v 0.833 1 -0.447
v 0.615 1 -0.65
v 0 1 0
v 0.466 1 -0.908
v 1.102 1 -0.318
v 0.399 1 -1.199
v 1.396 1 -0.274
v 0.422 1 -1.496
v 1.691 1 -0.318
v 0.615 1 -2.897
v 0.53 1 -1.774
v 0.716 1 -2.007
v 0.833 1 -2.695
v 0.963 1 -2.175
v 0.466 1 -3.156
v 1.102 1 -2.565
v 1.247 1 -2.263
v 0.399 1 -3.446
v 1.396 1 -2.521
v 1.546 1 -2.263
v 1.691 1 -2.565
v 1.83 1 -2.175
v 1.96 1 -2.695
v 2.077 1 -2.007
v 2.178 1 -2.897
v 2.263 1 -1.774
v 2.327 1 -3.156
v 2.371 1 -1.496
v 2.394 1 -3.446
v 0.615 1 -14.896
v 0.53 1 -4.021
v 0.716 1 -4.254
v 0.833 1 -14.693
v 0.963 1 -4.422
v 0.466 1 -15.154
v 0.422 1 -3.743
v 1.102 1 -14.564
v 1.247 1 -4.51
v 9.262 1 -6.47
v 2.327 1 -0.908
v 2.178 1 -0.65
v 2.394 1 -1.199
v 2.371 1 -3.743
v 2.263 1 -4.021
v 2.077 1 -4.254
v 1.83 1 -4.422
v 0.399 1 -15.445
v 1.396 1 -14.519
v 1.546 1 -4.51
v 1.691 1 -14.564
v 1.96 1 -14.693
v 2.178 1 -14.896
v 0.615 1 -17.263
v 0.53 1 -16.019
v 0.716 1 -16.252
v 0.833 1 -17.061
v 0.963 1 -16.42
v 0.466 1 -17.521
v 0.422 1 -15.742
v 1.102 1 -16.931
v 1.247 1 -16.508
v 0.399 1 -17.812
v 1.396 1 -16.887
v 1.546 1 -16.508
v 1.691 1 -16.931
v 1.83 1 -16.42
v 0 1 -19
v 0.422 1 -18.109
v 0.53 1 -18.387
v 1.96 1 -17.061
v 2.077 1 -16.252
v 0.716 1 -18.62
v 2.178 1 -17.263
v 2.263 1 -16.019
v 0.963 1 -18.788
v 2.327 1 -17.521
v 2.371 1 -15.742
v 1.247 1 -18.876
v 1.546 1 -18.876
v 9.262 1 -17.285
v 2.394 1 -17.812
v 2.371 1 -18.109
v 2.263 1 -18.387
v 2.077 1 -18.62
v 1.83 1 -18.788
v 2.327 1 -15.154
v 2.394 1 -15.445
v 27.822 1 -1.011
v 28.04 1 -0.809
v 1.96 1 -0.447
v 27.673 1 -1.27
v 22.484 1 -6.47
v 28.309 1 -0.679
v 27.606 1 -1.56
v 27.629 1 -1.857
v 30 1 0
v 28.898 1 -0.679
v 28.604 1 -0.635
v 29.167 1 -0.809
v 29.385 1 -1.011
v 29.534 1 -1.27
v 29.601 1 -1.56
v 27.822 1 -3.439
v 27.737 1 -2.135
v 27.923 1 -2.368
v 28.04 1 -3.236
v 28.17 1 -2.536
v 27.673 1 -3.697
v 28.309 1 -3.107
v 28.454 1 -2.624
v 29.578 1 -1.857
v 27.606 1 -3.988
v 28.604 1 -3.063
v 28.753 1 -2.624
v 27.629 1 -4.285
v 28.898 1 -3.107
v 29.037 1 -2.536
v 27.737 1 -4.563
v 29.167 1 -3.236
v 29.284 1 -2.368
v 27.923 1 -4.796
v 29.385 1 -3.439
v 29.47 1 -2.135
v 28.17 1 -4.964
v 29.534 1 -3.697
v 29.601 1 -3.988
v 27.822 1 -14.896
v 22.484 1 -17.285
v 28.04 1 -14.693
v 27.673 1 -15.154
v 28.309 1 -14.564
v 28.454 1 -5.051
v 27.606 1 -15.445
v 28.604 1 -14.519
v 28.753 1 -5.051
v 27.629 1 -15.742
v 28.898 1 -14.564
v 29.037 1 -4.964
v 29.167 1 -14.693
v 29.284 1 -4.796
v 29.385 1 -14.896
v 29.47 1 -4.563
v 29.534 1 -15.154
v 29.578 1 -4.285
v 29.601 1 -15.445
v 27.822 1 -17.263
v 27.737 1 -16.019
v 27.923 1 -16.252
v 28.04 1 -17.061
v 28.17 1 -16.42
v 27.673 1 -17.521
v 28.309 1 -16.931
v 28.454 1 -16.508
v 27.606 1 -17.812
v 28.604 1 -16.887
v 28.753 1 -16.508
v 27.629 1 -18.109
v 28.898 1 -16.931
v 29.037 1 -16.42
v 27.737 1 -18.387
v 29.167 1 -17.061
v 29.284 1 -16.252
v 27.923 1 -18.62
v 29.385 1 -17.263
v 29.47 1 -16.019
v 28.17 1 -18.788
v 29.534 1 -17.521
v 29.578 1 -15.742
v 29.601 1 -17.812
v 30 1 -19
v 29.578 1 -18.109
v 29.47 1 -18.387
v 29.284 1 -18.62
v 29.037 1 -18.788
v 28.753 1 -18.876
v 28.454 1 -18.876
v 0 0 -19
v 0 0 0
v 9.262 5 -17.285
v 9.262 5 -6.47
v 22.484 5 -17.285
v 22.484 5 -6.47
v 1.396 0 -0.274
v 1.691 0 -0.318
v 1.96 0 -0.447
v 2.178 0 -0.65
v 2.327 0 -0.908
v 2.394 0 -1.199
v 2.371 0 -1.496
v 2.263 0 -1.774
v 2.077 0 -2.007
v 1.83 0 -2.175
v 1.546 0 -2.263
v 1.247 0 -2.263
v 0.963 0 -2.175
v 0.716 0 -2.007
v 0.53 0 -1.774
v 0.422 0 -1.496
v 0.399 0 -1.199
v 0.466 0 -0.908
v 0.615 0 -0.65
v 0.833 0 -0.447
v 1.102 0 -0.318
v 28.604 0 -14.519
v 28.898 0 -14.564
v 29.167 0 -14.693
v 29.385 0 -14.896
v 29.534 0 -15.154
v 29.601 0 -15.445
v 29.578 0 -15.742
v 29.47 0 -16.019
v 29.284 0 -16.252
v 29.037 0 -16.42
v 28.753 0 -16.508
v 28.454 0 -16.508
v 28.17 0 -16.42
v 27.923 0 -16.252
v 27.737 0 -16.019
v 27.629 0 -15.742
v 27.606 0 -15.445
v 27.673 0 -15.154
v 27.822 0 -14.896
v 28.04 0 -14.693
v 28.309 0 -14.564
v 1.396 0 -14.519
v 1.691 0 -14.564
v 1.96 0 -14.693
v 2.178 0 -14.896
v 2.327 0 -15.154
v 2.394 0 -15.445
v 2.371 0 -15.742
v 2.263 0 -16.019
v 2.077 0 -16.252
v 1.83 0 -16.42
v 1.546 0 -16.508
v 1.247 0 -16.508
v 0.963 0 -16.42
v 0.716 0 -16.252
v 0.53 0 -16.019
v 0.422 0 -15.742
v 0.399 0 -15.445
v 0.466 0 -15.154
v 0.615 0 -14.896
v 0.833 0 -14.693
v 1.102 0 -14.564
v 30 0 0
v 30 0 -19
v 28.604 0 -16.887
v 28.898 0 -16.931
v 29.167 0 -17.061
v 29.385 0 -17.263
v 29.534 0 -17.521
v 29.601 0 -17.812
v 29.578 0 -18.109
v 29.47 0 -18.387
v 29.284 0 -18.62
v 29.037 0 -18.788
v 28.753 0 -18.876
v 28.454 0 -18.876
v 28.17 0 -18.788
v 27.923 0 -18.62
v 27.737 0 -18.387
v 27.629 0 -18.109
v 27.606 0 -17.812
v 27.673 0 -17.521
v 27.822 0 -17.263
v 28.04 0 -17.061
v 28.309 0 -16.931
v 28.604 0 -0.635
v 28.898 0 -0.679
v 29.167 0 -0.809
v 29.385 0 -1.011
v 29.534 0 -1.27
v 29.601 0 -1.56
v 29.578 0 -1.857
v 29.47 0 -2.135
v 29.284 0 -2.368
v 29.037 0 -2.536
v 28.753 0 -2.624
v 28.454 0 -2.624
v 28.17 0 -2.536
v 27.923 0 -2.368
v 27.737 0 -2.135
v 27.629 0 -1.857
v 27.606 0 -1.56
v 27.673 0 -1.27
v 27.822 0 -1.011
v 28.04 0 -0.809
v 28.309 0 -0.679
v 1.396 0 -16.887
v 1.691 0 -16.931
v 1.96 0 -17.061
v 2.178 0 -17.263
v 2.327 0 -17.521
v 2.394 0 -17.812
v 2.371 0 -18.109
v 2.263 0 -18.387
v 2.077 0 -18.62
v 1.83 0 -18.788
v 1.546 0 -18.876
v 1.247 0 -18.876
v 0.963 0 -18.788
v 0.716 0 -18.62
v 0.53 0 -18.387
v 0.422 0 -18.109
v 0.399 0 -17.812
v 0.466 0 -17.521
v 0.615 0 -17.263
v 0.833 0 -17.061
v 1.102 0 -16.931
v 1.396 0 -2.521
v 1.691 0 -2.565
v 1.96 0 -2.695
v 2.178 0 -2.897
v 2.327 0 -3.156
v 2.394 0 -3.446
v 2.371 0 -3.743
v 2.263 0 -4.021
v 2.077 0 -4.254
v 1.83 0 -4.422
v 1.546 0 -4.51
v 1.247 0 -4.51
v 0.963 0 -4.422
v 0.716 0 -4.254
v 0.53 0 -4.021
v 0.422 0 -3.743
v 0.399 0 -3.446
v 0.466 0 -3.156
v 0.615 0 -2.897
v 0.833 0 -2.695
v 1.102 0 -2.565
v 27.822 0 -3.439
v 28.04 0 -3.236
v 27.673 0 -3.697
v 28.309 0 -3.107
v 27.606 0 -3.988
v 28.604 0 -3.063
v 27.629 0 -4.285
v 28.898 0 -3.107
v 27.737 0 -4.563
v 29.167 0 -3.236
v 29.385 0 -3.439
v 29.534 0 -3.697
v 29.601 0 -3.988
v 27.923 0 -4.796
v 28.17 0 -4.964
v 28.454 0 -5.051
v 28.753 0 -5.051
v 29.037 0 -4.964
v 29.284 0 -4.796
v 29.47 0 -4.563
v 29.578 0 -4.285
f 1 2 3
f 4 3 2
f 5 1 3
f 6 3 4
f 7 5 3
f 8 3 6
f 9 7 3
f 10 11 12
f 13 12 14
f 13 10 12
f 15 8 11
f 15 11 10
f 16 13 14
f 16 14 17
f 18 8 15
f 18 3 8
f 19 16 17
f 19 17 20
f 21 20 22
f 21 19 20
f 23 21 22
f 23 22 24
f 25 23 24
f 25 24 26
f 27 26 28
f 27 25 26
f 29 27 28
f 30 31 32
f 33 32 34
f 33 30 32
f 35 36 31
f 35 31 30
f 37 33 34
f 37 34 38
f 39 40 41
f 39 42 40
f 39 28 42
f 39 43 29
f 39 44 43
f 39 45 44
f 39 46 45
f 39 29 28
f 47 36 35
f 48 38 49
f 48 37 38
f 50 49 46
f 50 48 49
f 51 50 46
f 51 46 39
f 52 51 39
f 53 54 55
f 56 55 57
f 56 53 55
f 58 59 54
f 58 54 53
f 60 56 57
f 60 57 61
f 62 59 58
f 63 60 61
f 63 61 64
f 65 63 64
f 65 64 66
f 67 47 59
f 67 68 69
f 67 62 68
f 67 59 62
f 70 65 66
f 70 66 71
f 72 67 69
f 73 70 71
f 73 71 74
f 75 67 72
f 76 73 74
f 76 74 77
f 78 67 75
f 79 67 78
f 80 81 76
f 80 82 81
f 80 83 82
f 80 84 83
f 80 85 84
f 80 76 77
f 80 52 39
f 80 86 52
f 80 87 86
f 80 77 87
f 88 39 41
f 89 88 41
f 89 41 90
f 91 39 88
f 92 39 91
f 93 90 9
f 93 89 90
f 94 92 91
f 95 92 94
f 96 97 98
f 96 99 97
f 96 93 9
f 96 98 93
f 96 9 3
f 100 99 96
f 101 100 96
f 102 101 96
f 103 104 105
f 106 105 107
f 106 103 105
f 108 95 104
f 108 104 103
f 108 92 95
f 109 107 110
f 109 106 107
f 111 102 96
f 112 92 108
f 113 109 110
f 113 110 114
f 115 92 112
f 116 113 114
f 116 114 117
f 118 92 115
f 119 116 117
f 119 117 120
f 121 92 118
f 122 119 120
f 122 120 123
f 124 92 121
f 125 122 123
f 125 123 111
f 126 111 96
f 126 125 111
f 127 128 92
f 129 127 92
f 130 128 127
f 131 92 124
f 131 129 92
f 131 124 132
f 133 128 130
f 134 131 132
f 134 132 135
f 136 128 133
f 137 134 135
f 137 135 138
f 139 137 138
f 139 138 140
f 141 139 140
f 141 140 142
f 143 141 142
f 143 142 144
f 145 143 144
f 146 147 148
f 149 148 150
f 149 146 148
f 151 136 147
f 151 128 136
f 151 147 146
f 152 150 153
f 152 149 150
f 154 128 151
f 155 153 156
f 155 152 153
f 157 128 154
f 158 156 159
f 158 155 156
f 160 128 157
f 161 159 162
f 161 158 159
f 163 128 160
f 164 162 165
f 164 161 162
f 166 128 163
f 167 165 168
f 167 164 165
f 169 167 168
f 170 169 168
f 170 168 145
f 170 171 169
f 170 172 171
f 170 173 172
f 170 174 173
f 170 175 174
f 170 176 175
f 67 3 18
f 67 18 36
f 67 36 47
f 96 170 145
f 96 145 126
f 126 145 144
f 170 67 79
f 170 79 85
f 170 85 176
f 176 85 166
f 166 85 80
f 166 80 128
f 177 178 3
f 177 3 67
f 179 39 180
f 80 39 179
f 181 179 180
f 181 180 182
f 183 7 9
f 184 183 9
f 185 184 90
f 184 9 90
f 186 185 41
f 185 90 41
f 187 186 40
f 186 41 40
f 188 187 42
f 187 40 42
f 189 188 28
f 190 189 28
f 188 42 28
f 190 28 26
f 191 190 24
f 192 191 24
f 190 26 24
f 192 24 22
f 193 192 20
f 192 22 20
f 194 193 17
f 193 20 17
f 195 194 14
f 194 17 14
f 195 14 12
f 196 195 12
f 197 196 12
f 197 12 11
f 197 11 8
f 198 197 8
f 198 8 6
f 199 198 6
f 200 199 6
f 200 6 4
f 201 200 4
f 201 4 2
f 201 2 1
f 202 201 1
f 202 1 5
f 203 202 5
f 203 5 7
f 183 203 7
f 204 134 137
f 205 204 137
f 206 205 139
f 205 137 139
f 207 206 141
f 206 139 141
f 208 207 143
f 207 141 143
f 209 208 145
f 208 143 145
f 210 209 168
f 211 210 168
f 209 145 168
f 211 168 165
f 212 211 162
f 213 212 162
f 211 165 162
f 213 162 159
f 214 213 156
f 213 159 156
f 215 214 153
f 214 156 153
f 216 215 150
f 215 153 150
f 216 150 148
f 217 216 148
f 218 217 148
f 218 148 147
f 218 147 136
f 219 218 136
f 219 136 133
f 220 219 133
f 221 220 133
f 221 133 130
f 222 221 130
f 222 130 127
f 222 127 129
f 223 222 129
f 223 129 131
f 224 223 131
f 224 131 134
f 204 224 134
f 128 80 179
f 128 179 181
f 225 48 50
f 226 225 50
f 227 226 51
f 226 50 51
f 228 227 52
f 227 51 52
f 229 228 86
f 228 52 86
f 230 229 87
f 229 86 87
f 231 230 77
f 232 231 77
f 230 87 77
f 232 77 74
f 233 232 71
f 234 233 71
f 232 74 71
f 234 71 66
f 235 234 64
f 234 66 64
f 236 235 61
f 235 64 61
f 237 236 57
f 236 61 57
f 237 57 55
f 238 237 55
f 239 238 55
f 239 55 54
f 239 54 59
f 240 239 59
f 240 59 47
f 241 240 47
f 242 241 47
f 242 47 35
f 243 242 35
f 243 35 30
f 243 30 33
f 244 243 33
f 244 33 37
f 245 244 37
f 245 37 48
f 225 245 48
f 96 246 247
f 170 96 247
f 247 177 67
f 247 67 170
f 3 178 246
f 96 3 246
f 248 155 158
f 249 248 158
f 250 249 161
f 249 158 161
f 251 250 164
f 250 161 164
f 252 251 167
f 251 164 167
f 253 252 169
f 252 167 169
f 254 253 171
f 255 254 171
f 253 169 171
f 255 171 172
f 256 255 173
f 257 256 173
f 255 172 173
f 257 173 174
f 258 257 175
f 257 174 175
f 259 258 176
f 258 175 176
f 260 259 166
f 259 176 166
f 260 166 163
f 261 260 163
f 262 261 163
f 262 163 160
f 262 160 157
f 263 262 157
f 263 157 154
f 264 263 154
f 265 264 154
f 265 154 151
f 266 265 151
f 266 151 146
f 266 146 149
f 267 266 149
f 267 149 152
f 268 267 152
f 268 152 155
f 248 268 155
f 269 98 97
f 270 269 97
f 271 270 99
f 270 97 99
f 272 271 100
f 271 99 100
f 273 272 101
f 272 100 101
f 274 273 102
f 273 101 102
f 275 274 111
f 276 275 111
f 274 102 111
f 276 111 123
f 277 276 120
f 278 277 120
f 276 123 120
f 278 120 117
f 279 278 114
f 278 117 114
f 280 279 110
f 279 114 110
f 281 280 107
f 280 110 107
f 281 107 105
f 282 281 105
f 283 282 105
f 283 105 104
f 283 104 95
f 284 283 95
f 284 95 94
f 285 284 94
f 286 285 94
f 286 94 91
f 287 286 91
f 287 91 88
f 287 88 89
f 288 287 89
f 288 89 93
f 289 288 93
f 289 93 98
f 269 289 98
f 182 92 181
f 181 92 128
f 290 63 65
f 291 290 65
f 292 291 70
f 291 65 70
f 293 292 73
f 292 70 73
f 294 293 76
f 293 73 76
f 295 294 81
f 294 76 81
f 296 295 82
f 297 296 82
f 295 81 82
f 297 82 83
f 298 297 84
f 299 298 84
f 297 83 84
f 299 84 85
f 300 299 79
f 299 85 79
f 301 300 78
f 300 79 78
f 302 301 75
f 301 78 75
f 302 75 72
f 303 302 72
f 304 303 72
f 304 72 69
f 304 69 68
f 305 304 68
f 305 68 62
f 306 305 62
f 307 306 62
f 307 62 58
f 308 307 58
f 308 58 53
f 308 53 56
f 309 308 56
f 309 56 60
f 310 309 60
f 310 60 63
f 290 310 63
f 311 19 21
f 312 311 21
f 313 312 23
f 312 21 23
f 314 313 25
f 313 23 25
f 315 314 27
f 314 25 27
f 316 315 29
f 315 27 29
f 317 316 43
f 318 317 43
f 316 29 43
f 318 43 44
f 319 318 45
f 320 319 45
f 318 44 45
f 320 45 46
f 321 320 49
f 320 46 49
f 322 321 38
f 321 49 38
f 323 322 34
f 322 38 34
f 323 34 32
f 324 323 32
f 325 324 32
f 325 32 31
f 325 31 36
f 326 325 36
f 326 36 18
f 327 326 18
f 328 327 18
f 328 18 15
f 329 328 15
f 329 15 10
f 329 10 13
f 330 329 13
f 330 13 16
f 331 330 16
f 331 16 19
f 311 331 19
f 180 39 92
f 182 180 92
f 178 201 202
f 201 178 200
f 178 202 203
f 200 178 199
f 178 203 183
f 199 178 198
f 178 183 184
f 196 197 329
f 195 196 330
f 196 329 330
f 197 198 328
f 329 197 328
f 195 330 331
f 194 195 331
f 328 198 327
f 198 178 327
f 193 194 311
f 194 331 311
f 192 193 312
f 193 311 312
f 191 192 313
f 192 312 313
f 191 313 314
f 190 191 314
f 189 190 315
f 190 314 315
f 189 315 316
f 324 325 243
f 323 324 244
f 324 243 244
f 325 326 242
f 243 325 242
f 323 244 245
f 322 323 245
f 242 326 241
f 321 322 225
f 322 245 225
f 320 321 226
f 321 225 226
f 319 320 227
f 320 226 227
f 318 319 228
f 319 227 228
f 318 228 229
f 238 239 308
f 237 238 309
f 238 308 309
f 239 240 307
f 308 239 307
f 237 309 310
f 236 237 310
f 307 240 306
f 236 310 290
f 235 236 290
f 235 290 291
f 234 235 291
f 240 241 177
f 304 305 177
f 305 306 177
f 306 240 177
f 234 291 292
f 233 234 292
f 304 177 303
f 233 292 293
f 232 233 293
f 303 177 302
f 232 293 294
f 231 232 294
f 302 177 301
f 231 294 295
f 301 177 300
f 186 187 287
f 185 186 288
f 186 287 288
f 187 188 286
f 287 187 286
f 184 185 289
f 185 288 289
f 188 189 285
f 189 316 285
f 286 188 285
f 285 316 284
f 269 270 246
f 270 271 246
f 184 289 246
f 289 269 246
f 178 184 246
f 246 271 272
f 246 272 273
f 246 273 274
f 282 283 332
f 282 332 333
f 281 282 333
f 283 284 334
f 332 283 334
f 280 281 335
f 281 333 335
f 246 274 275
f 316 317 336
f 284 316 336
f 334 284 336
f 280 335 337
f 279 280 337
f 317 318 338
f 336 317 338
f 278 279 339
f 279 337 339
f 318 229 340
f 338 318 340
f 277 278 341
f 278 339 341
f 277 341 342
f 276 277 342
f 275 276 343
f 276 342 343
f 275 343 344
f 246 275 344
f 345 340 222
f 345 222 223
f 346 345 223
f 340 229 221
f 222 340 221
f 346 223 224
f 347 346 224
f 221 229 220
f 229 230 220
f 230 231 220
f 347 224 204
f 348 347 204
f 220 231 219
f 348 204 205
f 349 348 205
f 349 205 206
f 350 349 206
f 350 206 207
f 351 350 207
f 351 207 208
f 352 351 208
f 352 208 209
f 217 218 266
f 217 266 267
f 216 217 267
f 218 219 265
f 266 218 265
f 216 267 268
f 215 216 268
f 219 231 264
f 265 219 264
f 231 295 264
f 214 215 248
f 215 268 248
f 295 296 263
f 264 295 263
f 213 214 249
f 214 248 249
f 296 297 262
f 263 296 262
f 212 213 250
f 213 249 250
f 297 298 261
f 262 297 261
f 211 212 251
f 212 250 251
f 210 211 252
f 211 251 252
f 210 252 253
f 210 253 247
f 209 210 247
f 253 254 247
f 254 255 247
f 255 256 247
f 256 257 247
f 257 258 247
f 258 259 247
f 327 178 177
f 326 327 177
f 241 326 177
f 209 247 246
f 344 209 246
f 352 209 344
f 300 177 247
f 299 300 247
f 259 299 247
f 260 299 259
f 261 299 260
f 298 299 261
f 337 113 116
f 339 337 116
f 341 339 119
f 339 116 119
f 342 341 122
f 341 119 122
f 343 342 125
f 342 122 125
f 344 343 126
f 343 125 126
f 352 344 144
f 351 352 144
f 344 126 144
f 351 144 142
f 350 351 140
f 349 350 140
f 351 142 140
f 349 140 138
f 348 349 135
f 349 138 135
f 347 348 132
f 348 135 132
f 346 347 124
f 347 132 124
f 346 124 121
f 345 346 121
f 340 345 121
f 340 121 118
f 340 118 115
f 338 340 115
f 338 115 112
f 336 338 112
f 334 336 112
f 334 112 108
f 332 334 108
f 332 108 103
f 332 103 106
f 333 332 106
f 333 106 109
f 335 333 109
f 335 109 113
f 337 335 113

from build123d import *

# Parameters (mm, degrees)
SKETCH1_W           = 30
SKETCH1_H           = 19
BOSS_EXTRUDE1_DEPTH = 1
SKETCH2_W           = 13.222286428
SKETCH2_H           = 10.81458632
BOSS_EXTRUDE2_DEPTH = 4
SKETCH3_R           = 1
CUT_EXTRUDE1_DEPTH  = 36.73513677


with BuildPart() as part:
    # Sketch1 → Boss-Extrude1 (new body)
    with BuildSketch(Plane(origin=(0, 0, 0), x_dir=(1, 0, 0), z_dir=(0, 1, 0))):
        with Locations((15, 9.5)):
            Rectangle(SKETCH1_W, SKETCH1_H)
    extrude(amount=BOSS_EXTRUDE1_DEPTH)

    # Sketch2 → Boss-Extrude2 (add)
    with BuildSketch(Plane(origin=(0, 1, 0), x_dir=(1, 0, 0), z_dir=(0, 1, 0))):
        with Locations((15.872791289, 11.877603857)):
            Rectangle(SKETCH2_W, SKETCH2_H)
    extrude(amount=BOSS_EXTRUDE2_DEPTH)

    # Sketch3 → Cut-Extrude1 (cut, through all)
    with BuildSketch(Plane(origin=(0, 1, 0), x_dir=(1, 0, 0), z_dir=(0, 1, 0))):
        with Locations(Location((1.396494389, 17.886822044, 0), (0, 0, 270))):
            Circle(SKETCH3_R)
        with Locations(Location((1.396494389, 15.519250271, 0), (0, 0, 270))):
            Circle(SKETCH3_R)
        with Locations(Location((1.396494389, 3.520878065, 0), (0, 0, 270))):
            Circle(SKETCH3_R)
        with Locations(Location((1.396494389, 1.273691297, 0), (0, 0, 270))):
            Circle(SKETCH3_R)
        with Locations(Location((28.603505611, 1.634846313, 0), (0, 0, 270))):
            Circle(SKETCH3_R)
        with Locations(Location((28.603505611, 4.062610589, 0), (0, 0, 270))):
            Circle(SKETCH3_R)
        with Locations(Location((28.603505611, 17.886822044, 0), (0, 0, 270))):
            Circle(SKETCH3_R)
        with Locations(Location((28.603505611, 15.519250271, 0), (0, 0, 270))):
            Circle(SKETCH3_R)
    extrude(amount=-CUT_EXTRUDE1_DEPTH, mode=Mode.SUBTRACT)


solid = part.part
